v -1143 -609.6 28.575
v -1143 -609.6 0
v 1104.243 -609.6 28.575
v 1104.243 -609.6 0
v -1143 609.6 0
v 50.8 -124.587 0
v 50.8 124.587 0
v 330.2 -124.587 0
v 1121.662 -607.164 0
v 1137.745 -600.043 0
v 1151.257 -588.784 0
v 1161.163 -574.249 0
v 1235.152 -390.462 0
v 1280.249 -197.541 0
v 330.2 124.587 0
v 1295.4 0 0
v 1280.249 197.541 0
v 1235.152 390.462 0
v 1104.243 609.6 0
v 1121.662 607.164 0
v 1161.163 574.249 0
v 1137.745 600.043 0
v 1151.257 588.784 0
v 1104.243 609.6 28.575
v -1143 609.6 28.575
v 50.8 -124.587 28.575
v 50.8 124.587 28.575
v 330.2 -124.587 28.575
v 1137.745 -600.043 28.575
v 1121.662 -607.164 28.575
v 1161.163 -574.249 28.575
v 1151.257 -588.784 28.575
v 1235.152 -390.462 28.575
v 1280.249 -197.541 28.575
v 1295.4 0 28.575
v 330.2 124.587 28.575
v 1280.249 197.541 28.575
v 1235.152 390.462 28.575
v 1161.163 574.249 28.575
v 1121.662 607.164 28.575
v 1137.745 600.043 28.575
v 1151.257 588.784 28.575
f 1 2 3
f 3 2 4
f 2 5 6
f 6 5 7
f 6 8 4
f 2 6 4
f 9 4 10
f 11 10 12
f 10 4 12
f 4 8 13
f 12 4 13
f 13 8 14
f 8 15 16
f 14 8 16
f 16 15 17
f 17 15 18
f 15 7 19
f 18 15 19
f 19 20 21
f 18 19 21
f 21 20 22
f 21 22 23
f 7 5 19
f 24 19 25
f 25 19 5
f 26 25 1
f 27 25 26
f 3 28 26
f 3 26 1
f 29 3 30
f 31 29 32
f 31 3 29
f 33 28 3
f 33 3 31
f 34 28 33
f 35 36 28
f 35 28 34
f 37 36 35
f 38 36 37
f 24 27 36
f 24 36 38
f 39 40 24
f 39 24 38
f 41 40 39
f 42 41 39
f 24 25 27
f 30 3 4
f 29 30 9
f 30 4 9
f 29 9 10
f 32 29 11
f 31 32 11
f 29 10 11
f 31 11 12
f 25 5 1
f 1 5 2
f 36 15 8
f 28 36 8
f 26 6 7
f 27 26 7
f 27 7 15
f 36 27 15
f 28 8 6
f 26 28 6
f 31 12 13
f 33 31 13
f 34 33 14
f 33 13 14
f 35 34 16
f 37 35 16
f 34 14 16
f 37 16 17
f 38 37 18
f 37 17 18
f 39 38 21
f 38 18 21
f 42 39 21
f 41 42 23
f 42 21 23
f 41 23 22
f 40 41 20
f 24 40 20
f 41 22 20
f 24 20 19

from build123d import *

# Parameters (mm, degrees)
F1_DEPTH = 28.575


# Not quite as in the source:
# - a feature names something its author has since deleted; it is built from what else it names


with BuildPart() as f1:
    # F0 (on Top) → F1 (new body)
    with BuildSketch(Plane.XY):
        with BuildLine():
            Line((1104.2429080596, 609.6), (-1143, 609.6))
            Line((-1143, 609.6), (-1143, 0))
            Line((-1143, 0), (50.8, 0))
            Line((50.8, 0), (50.8, 124.587))
            Line((50.8, 124.587), (330.2, 124.587))
            Line((330.2, 124.587), (330.2, 0))
            Line((330.2, 0), (1143, 0))
            Line((1143, 0), (1295.4, 0))
            ThreePointArc((1295.4, 0), (1261.3943180258, 294.8652818701), (1161.1626455885, 574.2494845361))
            ThreePointArc((1161.1626455885, 574.2494845361), (1137.7448313773, 600.0432213908), (1104.2429080596, 609.6))
        make_face()
        with BuildLine():
            Line((50.8, 0), (-1143, 0))
            Line((-1143, 0), (-1143, -609.6))
            Line((-1143, -609.6), (1104.2429080596, -609.6))
            ThreePointArc((1104.2429080596, -609.6), (1137.7448313773, -600.0432213908), (1161.1626455885, -574.2494845361))
            ThreePointArc((1161.1626455885, -574.2494845361), (1261.3943180258, -294.8652818701), (1295.4, 0))
            Line((1295.4, 0), (1143, 0))
            Line((1143, 0), (330.2, 0))
            Line((330.2, 0), (330.2, -124.587))
            Line((330.2, -124.587), (50.8, -124.587))
            Line((50.8, -124.587), (50.8, 0))
        make_face()
    extrude(amount=F1_DEPTH)


solid = f1.part
